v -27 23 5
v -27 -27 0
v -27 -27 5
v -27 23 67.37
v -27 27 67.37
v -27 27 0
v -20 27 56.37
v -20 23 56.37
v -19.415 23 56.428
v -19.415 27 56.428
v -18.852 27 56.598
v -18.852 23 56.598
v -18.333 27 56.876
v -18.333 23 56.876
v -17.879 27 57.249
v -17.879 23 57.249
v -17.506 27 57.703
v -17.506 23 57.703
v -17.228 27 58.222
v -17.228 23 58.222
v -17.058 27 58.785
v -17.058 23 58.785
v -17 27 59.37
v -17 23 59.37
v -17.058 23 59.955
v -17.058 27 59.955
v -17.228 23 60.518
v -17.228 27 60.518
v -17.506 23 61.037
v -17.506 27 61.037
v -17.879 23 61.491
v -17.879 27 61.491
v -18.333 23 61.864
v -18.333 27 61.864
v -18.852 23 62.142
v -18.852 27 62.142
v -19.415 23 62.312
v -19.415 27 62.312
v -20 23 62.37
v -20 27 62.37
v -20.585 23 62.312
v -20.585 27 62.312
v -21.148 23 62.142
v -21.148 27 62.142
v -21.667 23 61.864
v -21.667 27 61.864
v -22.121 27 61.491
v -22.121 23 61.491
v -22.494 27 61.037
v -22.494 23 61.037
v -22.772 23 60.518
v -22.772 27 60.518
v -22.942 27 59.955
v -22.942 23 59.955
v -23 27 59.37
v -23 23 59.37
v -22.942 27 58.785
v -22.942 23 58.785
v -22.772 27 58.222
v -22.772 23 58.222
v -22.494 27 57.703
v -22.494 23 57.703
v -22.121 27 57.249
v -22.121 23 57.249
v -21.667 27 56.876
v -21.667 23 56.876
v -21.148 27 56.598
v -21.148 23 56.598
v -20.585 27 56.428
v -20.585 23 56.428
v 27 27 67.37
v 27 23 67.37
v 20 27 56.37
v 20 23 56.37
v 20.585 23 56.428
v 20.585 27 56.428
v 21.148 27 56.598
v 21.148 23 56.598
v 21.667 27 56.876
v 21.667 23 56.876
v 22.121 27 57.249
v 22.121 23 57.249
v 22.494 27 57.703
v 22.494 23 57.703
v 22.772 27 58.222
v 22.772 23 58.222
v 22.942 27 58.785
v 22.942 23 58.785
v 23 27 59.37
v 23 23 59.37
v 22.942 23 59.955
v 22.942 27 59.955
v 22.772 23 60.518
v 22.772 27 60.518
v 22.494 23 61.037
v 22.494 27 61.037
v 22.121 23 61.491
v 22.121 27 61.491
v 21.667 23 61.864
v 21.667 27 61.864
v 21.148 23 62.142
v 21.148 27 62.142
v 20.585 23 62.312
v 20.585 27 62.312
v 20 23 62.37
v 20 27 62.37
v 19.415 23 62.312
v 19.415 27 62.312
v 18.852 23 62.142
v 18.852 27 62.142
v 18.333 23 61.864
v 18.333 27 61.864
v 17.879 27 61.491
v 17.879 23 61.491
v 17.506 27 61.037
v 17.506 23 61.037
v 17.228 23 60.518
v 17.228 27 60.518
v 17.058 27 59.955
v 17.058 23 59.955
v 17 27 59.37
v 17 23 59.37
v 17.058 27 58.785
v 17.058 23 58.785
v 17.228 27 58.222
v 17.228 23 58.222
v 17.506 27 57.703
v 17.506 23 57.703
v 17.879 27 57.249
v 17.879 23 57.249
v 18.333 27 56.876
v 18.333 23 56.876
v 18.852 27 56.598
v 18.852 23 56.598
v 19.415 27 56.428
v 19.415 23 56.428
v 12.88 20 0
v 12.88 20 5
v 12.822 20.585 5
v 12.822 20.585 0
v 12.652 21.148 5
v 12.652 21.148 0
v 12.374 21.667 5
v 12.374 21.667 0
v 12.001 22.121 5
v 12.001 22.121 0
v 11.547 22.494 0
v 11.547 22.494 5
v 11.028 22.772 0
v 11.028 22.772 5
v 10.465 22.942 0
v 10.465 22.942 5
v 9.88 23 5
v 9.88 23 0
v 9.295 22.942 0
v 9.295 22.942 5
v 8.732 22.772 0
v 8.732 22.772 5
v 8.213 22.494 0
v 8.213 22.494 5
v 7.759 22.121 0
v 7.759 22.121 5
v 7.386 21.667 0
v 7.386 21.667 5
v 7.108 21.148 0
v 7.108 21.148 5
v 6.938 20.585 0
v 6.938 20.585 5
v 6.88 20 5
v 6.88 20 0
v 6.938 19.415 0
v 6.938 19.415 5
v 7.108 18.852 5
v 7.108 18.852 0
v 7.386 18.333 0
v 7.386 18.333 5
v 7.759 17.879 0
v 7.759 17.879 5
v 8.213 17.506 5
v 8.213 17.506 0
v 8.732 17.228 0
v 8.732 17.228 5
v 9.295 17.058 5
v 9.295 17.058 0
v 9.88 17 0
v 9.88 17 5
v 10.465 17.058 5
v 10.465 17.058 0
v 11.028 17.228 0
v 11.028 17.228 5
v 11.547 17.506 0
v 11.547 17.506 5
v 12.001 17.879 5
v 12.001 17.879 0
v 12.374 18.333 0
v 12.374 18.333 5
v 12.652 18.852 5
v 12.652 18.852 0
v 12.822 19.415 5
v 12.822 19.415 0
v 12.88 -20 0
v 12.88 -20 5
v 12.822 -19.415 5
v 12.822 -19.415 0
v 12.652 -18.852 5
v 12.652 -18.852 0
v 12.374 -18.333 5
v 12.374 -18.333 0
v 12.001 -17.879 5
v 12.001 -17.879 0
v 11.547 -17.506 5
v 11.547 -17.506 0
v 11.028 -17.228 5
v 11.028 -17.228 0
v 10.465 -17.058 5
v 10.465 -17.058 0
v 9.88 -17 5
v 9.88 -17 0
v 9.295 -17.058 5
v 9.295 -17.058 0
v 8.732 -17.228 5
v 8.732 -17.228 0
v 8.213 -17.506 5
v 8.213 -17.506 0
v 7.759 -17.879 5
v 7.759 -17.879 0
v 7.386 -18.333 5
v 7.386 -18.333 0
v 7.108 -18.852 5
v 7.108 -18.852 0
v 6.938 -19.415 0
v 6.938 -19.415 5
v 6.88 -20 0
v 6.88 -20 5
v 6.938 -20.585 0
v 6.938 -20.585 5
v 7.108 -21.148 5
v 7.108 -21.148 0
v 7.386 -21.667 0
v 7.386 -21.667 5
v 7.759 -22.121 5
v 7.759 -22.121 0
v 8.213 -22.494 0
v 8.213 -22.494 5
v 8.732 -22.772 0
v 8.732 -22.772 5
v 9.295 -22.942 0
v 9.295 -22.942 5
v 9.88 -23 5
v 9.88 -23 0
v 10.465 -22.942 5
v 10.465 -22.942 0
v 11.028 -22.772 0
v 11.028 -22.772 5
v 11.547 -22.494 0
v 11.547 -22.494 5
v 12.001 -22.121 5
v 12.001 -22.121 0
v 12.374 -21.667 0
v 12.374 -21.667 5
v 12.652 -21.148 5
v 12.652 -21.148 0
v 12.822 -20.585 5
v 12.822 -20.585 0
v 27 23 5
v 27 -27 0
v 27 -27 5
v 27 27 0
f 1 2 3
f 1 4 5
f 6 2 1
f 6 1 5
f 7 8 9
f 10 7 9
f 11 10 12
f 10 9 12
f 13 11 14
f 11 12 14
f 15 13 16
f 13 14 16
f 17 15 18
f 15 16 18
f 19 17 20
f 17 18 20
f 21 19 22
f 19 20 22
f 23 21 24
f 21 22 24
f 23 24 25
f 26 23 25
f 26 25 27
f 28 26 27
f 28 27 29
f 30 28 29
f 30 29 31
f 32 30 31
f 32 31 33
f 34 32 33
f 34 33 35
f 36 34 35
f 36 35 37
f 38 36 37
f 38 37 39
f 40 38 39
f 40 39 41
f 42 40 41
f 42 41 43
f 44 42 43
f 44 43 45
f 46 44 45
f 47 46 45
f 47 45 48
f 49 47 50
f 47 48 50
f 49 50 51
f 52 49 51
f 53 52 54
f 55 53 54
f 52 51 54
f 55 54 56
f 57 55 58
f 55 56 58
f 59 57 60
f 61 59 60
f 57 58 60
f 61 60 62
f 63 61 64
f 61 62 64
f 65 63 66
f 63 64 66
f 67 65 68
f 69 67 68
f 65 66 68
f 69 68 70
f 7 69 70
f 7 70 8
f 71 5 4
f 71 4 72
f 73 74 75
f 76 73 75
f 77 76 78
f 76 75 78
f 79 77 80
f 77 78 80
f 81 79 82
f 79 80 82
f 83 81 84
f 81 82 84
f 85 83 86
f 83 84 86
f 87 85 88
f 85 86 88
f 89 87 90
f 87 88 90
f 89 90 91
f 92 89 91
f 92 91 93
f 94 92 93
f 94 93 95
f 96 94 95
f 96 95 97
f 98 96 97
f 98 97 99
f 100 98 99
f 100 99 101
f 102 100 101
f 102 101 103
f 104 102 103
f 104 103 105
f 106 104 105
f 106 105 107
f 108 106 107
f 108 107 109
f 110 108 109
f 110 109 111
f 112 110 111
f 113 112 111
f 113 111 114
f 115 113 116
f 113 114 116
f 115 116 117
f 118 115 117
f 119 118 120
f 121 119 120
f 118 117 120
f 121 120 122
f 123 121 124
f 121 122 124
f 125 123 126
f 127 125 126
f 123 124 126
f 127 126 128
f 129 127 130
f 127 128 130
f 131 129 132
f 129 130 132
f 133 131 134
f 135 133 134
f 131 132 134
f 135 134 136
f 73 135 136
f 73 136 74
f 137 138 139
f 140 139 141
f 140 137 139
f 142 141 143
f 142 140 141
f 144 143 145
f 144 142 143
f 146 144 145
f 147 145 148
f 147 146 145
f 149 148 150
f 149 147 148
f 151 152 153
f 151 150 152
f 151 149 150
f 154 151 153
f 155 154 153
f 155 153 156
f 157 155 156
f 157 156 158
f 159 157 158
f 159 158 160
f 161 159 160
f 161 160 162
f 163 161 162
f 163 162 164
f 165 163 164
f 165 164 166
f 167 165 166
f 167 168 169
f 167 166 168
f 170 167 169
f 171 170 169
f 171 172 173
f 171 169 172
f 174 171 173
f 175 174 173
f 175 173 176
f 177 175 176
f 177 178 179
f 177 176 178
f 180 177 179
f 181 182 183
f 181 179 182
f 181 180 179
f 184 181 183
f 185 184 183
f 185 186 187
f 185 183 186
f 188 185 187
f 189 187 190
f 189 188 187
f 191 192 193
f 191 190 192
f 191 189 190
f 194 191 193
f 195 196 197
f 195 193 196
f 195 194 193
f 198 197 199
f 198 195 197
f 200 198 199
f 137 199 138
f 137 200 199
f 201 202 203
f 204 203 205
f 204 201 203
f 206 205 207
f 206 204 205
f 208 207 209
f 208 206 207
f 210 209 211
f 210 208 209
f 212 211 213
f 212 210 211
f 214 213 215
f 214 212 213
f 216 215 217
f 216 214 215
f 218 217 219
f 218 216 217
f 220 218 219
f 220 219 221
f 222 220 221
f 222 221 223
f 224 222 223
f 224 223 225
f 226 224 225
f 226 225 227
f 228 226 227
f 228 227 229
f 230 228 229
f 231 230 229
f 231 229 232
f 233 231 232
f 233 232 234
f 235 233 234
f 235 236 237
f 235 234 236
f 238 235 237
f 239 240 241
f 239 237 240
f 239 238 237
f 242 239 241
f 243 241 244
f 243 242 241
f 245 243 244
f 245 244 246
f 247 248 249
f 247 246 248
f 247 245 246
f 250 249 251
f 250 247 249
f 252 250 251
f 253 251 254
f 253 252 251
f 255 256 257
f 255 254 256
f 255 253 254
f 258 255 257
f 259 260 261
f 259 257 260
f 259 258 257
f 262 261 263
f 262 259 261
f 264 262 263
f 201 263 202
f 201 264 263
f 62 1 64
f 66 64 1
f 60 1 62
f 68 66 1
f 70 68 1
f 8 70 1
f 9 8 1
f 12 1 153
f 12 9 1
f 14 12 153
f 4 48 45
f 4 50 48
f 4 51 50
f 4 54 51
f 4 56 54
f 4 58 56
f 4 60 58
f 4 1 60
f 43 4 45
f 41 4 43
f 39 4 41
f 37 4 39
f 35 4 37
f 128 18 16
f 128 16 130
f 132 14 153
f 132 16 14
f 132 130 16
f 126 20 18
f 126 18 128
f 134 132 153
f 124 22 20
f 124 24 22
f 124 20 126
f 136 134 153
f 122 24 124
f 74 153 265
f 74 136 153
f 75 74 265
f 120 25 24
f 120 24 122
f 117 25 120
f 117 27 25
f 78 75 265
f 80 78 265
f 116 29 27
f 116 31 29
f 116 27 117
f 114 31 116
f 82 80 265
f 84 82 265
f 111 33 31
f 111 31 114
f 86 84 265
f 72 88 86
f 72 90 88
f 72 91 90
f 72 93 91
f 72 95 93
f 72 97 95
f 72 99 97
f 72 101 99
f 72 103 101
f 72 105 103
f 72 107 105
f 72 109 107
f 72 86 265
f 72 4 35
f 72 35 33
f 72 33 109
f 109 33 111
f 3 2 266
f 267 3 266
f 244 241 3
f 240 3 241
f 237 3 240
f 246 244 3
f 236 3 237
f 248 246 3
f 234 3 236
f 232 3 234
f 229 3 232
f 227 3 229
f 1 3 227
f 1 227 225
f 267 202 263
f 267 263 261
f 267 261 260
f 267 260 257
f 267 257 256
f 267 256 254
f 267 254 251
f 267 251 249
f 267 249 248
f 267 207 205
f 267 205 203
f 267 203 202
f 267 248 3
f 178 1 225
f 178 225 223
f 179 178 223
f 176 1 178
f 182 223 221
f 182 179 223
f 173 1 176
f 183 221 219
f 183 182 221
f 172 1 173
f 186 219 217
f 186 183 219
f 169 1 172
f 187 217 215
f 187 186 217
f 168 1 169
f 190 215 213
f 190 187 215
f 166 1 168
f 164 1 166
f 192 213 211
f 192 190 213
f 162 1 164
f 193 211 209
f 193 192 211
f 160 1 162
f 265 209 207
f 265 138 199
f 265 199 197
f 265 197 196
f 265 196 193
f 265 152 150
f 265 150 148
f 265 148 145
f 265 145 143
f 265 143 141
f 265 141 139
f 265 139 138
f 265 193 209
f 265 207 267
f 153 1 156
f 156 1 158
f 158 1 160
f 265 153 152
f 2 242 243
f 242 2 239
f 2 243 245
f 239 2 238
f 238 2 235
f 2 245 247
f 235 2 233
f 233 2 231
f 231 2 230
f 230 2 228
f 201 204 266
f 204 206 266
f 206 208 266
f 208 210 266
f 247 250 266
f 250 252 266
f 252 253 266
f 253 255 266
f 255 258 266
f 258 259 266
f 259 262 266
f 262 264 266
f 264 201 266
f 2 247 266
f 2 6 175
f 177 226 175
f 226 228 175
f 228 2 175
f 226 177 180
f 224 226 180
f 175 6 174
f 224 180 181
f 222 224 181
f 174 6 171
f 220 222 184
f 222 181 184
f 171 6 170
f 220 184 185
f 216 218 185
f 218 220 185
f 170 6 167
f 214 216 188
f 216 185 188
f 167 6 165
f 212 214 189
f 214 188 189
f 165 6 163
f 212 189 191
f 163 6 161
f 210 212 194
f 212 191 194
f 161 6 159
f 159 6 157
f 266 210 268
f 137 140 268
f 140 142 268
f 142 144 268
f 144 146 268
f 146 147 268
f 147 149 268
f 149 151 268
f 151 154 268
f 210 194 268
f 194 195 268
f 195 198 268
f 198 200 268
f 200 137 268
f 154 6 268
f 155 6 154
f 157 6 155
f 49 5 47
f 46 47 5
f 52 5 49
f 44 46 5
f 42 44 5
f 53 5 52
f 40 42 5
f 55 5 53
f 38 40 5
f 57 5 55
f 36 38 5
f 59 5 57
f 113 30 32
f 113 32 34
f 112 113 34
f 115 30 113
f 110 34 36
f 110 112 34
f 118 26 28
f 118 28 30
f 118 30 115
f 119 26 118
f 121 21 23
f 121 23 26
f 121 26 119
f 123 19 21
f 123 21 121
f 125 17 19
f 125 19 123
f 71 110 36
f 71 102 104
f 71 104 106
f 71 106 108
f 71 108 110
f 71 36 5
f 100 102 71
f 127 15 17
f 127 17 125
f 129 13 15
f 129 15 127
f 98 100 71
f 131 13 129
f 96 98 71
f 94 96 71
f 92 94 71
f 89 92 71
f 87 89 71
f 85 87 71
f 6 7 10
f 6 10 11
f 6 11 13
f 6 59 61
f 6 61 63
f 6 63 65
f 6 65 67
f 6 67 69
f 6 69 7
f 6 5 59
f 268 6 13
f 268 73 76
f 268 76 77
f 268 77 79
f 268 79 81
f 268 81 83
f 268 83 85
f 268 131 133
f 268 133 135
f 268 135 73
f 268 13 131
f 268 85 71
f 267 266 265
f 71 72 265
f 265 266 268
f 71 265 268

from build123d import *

# Parameters (mm, degrees)
ESQUISSE1_W             = 54
ESQUISSE1_H             = 54
ESQUISSE1_R             = 3
BOSS_EXTRU_1_DEPTH      = 67.37
ESQUISSE2_W             = 85.887974464
ESQUISSE2_H             = 58.790343592
ENL_V_MAT_EXTRU_1_DEPTH = 62.37
ESQUISSE3_R             = 3
ENL_V_MAT_EXTRU_2_DEPTH = 62.37


with BuildPart() as part:
    # Esquisse1 → Boss.-Extru.1 (new body)
    with BuildSketch(Plane.XY):
        Rectangle(ESQUISSE1_W, ESQUISSE1_H)
        with Locations((9.88, 20)):
            Circle(ESQUISSE1_R, mode=Mode.SUBTRACT)
        with Locations((9.88, -20)):
            Circle(ESQUISSE1_R, mode=Mode.SUBTRACT)
    extrude(amount=BOSS_EXTRU_1_DEPTH)

    # Esquisse2 → Enlèv. mat.-Extru.1 (cut)
    with BuildSketch(Plane.XY.offset(67.37)):
        with Locations((-4.168944697, -6.395171796)):
            Rectangle(ESQUISSE2_W, ESQUISSE2_H)
    extrude(amount=-ENL_V_MAT_EXTRU_1_DEPTH, mode=Mode.SUBTRACT)

    # Esquisse3 → Enlèv. mat.-Extru.2 (cut)
    with BuildSketch(Plane.XZ.offset(-23)):
        with Locations(Location((-20, 59.37, 0), (0, 0, 270))):
            Circle(ESQUISSE3_R)
        with Locations(Location((20, 59.37, 0), (0, 0, 270))):
            Circle(ESQUISSE3_R)
    extrude(amount=-ENL_V_MAT_EXTRU_2_DEPTH, mode=Mode.SUBTRACT)


solid = part.part
